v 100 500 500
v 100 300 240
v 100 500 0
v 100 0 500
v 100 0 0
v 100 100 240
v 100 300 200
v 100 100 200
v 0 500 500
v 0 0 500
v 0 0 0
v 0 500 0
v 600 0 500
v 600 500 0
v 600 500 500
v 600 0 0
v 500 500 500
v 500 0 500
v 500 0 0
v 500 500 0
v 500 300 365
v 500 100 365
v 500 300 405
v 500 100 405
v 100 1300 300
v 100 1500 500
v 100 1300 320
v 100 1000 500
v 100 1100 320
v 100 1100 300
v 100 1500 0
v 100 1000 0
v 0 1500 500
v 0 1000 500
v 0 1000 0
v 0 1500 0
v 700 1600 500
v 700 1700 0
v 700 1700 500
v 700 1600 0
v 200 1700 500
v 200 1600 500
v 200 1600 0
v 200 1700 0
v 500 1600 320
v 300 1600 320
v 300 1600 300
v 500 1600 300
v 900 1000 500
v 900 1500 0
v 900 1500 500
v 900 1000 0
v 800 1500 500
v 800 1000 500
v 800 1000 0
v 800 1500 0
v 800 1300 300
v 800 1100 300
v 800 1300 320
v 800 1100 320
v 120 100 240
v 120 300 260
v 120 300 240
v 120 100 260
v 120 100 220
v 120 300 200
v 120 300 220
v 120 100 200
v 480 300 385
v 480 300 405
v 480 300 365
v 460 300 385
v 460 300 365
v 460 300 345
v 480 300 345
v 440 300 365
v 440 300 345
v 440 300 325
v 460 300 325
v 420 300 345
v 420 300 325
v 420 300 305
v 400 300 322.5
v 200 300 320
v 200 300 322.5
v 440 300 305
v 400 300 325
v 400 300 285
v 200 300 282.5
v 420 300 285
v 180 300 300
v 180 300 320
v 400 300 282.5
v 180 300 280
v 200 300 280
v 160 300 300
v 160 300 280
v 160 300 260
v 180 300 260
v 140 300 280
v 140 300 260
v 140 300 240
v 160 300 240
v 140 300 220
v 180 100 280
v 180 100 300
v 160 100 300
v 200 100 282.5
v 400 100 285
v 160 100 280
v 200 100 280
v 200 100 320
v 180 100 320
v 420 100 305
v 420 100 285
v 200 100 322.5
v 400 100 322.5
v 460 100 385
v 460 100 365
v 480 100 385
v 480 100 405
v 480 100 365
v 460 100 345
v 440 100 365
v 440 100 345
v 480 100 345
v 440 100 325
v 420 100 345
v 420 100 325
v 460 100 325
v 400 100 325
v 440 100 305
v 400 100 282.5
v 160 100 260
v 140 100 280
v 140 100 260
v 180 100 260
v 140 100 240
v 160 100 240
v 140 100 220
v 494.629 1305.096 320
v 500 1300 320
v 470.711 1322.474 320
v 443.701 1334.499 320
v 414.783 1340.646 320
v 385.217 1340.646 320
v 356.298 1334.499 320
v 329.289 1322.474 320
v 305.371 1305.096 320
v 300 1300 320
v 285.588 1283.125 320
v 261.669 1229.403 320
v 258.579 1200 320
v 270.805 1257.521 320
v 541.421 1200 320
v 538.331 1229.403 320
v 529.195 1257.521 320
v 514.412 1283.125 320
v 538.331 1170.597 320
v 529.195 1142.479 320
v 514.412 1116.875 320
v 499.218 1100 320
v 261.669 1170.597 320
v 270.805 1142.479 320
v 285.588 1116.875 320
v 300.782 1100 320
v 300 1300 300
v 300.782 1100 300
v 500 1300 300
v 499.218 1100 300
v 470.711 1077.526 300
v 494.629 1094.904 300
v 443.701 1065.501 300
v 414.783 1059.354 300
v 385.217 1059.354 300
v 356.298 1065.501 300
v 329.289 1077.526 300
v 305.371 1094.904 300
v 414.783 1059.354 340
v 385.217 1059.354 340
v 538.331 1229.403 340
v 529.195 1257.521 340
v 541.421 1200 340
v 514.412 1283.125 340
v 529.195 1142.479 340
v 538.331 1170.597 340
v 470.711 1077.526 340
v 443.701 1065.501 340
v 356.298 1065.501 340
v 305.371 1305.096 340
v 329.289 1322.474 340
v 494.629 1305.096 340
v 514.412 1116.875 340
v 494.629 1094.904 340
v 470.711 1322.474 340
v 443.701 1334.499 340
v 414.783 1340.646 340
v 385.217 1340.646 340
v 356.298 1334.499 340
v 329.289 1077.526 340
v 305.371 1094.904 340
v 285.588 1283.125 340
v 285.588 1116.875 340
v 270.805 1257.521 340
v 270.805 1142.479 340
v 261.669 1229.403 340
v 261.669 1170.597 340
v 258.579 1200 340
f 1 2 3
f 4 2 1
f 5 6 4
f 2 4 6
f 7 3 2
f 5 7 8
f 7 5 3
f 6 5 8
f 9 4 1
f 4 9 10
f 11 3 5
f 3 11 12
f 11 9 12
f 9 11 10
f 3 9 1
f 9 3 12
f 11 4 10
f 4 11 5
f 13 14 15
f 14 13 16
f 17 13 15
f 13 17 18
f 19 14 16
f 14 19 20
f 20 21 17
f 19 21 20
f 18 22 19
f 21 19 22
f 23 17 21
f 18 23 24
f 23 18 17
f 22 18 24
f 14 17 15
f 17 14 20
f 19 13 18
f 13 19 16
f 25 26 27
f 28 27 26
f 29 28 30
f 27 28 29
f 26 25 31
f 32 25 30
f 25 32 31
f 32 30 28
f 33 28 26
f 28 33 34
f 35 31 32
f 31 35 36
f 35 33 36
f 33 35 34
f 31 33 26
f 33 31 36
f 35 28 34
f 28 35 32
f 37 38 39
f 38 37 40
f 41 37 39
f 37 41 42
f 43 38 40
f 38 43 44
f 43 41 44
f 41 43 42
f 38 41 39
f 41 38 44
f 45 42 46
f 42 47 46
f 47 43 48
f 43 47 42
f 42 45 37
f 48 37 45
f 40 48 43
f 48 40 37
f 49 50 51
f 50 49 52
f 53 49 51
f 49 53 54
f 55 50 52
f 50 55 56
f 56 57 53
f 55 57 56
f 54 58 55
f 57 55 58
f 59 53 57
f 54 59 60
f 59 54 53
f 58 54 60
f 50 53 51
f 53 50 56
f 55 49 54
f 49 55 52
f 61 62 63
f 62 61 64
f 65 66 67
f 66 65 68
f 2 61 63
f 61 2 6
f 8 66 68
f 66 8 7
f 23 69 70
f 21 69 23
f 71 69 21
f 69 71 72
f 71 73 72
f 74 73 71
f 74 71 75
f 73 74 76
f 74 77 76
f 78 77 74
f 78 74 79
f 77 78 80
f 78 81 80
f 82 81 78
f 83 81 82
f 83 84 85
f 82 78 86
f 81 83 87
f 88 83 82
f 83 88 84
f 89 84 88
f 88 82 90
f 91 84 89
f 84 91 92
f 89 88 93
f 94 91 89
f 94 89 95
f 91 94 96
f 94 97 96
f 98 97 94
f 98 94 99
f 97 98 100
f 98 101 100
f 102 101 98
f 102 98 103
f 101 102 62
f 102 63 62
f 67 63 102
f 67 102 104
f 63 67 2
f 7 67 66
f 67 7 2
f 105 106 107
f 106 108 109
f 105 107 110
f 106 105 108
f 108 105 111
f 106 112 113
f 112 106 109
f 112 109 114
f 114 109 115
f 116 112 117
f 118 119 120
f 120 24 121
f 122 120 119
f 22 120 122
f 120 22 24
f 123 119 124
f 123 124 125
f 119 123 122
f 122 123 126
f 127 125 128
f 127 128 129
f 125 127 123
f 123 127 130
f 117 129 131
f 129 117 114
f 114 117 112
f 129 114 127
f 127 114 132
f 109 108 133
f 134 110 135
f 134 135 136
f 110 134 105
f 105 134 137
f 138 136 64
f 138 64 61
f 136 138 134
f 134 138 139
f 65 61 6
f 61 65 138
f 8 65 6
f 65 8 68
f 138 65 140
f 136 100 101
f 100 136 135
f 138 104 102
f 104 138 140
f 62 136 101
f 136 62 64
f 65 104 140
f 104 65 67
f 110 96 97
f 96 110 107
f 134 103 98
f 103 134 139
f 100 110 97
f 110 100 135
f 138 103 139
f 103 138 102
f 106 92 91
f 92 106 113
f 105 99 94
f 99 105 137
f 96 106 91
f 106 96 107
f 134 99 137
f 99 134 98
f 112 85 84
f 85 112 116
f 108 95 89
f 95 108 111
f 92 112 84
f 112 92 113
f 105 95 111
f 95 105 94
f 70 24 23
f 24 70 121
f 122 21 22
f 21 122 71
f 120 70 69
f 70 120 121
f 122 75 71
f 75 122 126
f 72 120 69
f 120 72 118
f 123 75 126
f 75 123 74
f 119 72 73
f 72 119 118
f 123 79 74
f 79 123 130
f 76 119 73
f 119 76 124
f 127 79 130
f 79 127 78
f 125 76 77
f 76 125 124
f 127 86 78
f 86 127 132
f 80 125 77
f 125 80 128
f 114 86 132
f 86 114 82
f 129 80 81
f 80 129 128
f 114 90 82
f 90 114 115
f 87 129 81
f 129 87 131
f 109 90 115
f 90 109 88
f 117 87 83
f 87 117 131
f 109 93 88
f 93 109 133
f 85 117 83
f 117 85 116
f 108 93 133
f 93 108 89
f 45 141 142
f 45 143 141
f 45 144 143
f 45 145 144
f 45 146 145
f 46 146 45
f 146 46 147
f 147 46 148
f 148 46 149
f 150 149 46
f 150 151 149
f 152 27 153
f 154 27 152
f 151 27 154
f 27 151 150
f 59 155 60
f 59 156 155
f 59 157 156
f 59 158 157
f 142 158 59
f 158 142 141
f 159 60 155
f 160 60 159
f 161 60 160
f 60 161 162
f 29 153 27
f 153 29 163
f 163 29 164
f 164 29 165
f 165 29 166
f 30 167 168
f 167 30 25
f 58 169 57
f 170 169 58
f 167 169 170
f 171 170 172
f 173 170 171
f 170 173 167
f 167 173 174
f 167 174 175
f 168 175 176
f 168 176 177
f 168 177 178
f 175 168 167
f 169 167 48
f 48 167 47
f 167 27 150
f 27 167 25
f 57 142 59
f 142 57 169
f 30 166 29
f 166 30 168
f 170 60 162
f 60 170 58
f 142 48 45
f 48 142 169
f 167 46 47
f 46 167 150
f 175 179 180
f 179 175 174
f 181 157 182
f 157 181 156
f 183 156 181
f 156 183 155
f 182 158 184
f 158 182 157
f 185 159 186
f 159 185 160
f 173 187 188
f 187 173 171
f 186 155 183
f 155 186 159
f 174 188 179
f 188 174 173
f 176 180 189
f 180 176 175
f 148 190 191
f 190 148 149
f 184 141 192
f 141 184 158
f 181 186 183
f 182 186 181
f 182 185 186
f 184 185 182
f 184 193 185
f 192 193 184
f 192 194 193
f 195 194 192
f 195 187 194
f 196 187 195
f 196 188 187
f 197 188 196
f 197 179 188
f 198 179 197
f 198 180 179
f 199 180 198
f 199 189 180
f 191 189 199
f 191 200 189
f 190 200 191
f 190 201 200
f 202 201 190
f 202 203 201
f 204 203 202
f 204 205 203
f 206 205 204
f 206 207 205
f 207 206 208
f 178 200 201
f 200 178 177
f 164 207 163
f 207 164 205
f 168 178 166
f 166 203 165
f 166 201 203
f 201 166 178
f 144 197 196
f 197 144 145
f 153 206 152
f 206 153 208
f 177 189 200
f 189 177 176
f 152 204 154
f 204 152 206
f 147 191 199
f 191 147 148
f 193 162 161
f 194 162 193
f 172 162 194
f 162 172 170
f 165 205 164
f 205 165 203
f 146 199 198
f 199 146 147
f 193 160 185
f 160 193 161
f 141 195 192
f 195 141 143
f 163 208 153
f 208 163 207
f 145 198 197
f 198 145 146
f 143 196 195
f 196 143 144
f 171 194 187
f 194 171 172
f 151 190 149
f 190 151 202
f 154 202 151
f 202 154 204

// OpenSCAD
translate([0,0,0]){rotate([0,0,0]){cube([100,500,500]);};};
translate([500,0,0]){rotate([0,0,0]){cube([100,500,500]);};};
translate([0,1000,0]){rotate([0,0,0]){cube([100,500,500]);};};
translate([200,1600,0]){rotate([0,0,0]){cube([500,100,500]);};};
translate([800,1000,0]){rotate([0,0,0]){cube([100,500,500]);};};
translate([100,100,200]){rotate([0,0,0]){cube([20,200,40]);};};
translate([120,100,220]){rotate([0,0,0]){cube([20,200,40]);};};
translate([140,100,240]){rotate([0,0,0]){cube([20,200,40]);};};
translate([160,100,260]){rotate([0,0,0]){cube([20,200,40]);};};
translate([180,100,280]){rotate([0,0,0]){cube([20,200,40]);};};
translate([480,100,365]){rotate([0,0,0]){cube([20,200,40]);};};
translate([460,100,345]){rotate([0,0,0]){cube([20,200,40]);};};
translate([440,100,325]){rotate([0,0,0]){cube([20,200,40]);};};
translate([420,100,305]){rotate([0,0,0]){cube([20,200,40]);};};
translate([400,100,285]){rotate([0,0,0]){cube([20,200,40]);};};
translate([200,100,282.5]){rotate([0,0,0]){cube([200,200,40]);};};
translate([100,1100,300]){rotate([0,0,0]){cube([700,200,20]);};};
translate([300,1100,300]){rotate([0,0,0]){cube([200,500,20]);};};
translate([400,1200,300]){rotate([0,0,0]){cylinder(40,141.421,141.421);};};
